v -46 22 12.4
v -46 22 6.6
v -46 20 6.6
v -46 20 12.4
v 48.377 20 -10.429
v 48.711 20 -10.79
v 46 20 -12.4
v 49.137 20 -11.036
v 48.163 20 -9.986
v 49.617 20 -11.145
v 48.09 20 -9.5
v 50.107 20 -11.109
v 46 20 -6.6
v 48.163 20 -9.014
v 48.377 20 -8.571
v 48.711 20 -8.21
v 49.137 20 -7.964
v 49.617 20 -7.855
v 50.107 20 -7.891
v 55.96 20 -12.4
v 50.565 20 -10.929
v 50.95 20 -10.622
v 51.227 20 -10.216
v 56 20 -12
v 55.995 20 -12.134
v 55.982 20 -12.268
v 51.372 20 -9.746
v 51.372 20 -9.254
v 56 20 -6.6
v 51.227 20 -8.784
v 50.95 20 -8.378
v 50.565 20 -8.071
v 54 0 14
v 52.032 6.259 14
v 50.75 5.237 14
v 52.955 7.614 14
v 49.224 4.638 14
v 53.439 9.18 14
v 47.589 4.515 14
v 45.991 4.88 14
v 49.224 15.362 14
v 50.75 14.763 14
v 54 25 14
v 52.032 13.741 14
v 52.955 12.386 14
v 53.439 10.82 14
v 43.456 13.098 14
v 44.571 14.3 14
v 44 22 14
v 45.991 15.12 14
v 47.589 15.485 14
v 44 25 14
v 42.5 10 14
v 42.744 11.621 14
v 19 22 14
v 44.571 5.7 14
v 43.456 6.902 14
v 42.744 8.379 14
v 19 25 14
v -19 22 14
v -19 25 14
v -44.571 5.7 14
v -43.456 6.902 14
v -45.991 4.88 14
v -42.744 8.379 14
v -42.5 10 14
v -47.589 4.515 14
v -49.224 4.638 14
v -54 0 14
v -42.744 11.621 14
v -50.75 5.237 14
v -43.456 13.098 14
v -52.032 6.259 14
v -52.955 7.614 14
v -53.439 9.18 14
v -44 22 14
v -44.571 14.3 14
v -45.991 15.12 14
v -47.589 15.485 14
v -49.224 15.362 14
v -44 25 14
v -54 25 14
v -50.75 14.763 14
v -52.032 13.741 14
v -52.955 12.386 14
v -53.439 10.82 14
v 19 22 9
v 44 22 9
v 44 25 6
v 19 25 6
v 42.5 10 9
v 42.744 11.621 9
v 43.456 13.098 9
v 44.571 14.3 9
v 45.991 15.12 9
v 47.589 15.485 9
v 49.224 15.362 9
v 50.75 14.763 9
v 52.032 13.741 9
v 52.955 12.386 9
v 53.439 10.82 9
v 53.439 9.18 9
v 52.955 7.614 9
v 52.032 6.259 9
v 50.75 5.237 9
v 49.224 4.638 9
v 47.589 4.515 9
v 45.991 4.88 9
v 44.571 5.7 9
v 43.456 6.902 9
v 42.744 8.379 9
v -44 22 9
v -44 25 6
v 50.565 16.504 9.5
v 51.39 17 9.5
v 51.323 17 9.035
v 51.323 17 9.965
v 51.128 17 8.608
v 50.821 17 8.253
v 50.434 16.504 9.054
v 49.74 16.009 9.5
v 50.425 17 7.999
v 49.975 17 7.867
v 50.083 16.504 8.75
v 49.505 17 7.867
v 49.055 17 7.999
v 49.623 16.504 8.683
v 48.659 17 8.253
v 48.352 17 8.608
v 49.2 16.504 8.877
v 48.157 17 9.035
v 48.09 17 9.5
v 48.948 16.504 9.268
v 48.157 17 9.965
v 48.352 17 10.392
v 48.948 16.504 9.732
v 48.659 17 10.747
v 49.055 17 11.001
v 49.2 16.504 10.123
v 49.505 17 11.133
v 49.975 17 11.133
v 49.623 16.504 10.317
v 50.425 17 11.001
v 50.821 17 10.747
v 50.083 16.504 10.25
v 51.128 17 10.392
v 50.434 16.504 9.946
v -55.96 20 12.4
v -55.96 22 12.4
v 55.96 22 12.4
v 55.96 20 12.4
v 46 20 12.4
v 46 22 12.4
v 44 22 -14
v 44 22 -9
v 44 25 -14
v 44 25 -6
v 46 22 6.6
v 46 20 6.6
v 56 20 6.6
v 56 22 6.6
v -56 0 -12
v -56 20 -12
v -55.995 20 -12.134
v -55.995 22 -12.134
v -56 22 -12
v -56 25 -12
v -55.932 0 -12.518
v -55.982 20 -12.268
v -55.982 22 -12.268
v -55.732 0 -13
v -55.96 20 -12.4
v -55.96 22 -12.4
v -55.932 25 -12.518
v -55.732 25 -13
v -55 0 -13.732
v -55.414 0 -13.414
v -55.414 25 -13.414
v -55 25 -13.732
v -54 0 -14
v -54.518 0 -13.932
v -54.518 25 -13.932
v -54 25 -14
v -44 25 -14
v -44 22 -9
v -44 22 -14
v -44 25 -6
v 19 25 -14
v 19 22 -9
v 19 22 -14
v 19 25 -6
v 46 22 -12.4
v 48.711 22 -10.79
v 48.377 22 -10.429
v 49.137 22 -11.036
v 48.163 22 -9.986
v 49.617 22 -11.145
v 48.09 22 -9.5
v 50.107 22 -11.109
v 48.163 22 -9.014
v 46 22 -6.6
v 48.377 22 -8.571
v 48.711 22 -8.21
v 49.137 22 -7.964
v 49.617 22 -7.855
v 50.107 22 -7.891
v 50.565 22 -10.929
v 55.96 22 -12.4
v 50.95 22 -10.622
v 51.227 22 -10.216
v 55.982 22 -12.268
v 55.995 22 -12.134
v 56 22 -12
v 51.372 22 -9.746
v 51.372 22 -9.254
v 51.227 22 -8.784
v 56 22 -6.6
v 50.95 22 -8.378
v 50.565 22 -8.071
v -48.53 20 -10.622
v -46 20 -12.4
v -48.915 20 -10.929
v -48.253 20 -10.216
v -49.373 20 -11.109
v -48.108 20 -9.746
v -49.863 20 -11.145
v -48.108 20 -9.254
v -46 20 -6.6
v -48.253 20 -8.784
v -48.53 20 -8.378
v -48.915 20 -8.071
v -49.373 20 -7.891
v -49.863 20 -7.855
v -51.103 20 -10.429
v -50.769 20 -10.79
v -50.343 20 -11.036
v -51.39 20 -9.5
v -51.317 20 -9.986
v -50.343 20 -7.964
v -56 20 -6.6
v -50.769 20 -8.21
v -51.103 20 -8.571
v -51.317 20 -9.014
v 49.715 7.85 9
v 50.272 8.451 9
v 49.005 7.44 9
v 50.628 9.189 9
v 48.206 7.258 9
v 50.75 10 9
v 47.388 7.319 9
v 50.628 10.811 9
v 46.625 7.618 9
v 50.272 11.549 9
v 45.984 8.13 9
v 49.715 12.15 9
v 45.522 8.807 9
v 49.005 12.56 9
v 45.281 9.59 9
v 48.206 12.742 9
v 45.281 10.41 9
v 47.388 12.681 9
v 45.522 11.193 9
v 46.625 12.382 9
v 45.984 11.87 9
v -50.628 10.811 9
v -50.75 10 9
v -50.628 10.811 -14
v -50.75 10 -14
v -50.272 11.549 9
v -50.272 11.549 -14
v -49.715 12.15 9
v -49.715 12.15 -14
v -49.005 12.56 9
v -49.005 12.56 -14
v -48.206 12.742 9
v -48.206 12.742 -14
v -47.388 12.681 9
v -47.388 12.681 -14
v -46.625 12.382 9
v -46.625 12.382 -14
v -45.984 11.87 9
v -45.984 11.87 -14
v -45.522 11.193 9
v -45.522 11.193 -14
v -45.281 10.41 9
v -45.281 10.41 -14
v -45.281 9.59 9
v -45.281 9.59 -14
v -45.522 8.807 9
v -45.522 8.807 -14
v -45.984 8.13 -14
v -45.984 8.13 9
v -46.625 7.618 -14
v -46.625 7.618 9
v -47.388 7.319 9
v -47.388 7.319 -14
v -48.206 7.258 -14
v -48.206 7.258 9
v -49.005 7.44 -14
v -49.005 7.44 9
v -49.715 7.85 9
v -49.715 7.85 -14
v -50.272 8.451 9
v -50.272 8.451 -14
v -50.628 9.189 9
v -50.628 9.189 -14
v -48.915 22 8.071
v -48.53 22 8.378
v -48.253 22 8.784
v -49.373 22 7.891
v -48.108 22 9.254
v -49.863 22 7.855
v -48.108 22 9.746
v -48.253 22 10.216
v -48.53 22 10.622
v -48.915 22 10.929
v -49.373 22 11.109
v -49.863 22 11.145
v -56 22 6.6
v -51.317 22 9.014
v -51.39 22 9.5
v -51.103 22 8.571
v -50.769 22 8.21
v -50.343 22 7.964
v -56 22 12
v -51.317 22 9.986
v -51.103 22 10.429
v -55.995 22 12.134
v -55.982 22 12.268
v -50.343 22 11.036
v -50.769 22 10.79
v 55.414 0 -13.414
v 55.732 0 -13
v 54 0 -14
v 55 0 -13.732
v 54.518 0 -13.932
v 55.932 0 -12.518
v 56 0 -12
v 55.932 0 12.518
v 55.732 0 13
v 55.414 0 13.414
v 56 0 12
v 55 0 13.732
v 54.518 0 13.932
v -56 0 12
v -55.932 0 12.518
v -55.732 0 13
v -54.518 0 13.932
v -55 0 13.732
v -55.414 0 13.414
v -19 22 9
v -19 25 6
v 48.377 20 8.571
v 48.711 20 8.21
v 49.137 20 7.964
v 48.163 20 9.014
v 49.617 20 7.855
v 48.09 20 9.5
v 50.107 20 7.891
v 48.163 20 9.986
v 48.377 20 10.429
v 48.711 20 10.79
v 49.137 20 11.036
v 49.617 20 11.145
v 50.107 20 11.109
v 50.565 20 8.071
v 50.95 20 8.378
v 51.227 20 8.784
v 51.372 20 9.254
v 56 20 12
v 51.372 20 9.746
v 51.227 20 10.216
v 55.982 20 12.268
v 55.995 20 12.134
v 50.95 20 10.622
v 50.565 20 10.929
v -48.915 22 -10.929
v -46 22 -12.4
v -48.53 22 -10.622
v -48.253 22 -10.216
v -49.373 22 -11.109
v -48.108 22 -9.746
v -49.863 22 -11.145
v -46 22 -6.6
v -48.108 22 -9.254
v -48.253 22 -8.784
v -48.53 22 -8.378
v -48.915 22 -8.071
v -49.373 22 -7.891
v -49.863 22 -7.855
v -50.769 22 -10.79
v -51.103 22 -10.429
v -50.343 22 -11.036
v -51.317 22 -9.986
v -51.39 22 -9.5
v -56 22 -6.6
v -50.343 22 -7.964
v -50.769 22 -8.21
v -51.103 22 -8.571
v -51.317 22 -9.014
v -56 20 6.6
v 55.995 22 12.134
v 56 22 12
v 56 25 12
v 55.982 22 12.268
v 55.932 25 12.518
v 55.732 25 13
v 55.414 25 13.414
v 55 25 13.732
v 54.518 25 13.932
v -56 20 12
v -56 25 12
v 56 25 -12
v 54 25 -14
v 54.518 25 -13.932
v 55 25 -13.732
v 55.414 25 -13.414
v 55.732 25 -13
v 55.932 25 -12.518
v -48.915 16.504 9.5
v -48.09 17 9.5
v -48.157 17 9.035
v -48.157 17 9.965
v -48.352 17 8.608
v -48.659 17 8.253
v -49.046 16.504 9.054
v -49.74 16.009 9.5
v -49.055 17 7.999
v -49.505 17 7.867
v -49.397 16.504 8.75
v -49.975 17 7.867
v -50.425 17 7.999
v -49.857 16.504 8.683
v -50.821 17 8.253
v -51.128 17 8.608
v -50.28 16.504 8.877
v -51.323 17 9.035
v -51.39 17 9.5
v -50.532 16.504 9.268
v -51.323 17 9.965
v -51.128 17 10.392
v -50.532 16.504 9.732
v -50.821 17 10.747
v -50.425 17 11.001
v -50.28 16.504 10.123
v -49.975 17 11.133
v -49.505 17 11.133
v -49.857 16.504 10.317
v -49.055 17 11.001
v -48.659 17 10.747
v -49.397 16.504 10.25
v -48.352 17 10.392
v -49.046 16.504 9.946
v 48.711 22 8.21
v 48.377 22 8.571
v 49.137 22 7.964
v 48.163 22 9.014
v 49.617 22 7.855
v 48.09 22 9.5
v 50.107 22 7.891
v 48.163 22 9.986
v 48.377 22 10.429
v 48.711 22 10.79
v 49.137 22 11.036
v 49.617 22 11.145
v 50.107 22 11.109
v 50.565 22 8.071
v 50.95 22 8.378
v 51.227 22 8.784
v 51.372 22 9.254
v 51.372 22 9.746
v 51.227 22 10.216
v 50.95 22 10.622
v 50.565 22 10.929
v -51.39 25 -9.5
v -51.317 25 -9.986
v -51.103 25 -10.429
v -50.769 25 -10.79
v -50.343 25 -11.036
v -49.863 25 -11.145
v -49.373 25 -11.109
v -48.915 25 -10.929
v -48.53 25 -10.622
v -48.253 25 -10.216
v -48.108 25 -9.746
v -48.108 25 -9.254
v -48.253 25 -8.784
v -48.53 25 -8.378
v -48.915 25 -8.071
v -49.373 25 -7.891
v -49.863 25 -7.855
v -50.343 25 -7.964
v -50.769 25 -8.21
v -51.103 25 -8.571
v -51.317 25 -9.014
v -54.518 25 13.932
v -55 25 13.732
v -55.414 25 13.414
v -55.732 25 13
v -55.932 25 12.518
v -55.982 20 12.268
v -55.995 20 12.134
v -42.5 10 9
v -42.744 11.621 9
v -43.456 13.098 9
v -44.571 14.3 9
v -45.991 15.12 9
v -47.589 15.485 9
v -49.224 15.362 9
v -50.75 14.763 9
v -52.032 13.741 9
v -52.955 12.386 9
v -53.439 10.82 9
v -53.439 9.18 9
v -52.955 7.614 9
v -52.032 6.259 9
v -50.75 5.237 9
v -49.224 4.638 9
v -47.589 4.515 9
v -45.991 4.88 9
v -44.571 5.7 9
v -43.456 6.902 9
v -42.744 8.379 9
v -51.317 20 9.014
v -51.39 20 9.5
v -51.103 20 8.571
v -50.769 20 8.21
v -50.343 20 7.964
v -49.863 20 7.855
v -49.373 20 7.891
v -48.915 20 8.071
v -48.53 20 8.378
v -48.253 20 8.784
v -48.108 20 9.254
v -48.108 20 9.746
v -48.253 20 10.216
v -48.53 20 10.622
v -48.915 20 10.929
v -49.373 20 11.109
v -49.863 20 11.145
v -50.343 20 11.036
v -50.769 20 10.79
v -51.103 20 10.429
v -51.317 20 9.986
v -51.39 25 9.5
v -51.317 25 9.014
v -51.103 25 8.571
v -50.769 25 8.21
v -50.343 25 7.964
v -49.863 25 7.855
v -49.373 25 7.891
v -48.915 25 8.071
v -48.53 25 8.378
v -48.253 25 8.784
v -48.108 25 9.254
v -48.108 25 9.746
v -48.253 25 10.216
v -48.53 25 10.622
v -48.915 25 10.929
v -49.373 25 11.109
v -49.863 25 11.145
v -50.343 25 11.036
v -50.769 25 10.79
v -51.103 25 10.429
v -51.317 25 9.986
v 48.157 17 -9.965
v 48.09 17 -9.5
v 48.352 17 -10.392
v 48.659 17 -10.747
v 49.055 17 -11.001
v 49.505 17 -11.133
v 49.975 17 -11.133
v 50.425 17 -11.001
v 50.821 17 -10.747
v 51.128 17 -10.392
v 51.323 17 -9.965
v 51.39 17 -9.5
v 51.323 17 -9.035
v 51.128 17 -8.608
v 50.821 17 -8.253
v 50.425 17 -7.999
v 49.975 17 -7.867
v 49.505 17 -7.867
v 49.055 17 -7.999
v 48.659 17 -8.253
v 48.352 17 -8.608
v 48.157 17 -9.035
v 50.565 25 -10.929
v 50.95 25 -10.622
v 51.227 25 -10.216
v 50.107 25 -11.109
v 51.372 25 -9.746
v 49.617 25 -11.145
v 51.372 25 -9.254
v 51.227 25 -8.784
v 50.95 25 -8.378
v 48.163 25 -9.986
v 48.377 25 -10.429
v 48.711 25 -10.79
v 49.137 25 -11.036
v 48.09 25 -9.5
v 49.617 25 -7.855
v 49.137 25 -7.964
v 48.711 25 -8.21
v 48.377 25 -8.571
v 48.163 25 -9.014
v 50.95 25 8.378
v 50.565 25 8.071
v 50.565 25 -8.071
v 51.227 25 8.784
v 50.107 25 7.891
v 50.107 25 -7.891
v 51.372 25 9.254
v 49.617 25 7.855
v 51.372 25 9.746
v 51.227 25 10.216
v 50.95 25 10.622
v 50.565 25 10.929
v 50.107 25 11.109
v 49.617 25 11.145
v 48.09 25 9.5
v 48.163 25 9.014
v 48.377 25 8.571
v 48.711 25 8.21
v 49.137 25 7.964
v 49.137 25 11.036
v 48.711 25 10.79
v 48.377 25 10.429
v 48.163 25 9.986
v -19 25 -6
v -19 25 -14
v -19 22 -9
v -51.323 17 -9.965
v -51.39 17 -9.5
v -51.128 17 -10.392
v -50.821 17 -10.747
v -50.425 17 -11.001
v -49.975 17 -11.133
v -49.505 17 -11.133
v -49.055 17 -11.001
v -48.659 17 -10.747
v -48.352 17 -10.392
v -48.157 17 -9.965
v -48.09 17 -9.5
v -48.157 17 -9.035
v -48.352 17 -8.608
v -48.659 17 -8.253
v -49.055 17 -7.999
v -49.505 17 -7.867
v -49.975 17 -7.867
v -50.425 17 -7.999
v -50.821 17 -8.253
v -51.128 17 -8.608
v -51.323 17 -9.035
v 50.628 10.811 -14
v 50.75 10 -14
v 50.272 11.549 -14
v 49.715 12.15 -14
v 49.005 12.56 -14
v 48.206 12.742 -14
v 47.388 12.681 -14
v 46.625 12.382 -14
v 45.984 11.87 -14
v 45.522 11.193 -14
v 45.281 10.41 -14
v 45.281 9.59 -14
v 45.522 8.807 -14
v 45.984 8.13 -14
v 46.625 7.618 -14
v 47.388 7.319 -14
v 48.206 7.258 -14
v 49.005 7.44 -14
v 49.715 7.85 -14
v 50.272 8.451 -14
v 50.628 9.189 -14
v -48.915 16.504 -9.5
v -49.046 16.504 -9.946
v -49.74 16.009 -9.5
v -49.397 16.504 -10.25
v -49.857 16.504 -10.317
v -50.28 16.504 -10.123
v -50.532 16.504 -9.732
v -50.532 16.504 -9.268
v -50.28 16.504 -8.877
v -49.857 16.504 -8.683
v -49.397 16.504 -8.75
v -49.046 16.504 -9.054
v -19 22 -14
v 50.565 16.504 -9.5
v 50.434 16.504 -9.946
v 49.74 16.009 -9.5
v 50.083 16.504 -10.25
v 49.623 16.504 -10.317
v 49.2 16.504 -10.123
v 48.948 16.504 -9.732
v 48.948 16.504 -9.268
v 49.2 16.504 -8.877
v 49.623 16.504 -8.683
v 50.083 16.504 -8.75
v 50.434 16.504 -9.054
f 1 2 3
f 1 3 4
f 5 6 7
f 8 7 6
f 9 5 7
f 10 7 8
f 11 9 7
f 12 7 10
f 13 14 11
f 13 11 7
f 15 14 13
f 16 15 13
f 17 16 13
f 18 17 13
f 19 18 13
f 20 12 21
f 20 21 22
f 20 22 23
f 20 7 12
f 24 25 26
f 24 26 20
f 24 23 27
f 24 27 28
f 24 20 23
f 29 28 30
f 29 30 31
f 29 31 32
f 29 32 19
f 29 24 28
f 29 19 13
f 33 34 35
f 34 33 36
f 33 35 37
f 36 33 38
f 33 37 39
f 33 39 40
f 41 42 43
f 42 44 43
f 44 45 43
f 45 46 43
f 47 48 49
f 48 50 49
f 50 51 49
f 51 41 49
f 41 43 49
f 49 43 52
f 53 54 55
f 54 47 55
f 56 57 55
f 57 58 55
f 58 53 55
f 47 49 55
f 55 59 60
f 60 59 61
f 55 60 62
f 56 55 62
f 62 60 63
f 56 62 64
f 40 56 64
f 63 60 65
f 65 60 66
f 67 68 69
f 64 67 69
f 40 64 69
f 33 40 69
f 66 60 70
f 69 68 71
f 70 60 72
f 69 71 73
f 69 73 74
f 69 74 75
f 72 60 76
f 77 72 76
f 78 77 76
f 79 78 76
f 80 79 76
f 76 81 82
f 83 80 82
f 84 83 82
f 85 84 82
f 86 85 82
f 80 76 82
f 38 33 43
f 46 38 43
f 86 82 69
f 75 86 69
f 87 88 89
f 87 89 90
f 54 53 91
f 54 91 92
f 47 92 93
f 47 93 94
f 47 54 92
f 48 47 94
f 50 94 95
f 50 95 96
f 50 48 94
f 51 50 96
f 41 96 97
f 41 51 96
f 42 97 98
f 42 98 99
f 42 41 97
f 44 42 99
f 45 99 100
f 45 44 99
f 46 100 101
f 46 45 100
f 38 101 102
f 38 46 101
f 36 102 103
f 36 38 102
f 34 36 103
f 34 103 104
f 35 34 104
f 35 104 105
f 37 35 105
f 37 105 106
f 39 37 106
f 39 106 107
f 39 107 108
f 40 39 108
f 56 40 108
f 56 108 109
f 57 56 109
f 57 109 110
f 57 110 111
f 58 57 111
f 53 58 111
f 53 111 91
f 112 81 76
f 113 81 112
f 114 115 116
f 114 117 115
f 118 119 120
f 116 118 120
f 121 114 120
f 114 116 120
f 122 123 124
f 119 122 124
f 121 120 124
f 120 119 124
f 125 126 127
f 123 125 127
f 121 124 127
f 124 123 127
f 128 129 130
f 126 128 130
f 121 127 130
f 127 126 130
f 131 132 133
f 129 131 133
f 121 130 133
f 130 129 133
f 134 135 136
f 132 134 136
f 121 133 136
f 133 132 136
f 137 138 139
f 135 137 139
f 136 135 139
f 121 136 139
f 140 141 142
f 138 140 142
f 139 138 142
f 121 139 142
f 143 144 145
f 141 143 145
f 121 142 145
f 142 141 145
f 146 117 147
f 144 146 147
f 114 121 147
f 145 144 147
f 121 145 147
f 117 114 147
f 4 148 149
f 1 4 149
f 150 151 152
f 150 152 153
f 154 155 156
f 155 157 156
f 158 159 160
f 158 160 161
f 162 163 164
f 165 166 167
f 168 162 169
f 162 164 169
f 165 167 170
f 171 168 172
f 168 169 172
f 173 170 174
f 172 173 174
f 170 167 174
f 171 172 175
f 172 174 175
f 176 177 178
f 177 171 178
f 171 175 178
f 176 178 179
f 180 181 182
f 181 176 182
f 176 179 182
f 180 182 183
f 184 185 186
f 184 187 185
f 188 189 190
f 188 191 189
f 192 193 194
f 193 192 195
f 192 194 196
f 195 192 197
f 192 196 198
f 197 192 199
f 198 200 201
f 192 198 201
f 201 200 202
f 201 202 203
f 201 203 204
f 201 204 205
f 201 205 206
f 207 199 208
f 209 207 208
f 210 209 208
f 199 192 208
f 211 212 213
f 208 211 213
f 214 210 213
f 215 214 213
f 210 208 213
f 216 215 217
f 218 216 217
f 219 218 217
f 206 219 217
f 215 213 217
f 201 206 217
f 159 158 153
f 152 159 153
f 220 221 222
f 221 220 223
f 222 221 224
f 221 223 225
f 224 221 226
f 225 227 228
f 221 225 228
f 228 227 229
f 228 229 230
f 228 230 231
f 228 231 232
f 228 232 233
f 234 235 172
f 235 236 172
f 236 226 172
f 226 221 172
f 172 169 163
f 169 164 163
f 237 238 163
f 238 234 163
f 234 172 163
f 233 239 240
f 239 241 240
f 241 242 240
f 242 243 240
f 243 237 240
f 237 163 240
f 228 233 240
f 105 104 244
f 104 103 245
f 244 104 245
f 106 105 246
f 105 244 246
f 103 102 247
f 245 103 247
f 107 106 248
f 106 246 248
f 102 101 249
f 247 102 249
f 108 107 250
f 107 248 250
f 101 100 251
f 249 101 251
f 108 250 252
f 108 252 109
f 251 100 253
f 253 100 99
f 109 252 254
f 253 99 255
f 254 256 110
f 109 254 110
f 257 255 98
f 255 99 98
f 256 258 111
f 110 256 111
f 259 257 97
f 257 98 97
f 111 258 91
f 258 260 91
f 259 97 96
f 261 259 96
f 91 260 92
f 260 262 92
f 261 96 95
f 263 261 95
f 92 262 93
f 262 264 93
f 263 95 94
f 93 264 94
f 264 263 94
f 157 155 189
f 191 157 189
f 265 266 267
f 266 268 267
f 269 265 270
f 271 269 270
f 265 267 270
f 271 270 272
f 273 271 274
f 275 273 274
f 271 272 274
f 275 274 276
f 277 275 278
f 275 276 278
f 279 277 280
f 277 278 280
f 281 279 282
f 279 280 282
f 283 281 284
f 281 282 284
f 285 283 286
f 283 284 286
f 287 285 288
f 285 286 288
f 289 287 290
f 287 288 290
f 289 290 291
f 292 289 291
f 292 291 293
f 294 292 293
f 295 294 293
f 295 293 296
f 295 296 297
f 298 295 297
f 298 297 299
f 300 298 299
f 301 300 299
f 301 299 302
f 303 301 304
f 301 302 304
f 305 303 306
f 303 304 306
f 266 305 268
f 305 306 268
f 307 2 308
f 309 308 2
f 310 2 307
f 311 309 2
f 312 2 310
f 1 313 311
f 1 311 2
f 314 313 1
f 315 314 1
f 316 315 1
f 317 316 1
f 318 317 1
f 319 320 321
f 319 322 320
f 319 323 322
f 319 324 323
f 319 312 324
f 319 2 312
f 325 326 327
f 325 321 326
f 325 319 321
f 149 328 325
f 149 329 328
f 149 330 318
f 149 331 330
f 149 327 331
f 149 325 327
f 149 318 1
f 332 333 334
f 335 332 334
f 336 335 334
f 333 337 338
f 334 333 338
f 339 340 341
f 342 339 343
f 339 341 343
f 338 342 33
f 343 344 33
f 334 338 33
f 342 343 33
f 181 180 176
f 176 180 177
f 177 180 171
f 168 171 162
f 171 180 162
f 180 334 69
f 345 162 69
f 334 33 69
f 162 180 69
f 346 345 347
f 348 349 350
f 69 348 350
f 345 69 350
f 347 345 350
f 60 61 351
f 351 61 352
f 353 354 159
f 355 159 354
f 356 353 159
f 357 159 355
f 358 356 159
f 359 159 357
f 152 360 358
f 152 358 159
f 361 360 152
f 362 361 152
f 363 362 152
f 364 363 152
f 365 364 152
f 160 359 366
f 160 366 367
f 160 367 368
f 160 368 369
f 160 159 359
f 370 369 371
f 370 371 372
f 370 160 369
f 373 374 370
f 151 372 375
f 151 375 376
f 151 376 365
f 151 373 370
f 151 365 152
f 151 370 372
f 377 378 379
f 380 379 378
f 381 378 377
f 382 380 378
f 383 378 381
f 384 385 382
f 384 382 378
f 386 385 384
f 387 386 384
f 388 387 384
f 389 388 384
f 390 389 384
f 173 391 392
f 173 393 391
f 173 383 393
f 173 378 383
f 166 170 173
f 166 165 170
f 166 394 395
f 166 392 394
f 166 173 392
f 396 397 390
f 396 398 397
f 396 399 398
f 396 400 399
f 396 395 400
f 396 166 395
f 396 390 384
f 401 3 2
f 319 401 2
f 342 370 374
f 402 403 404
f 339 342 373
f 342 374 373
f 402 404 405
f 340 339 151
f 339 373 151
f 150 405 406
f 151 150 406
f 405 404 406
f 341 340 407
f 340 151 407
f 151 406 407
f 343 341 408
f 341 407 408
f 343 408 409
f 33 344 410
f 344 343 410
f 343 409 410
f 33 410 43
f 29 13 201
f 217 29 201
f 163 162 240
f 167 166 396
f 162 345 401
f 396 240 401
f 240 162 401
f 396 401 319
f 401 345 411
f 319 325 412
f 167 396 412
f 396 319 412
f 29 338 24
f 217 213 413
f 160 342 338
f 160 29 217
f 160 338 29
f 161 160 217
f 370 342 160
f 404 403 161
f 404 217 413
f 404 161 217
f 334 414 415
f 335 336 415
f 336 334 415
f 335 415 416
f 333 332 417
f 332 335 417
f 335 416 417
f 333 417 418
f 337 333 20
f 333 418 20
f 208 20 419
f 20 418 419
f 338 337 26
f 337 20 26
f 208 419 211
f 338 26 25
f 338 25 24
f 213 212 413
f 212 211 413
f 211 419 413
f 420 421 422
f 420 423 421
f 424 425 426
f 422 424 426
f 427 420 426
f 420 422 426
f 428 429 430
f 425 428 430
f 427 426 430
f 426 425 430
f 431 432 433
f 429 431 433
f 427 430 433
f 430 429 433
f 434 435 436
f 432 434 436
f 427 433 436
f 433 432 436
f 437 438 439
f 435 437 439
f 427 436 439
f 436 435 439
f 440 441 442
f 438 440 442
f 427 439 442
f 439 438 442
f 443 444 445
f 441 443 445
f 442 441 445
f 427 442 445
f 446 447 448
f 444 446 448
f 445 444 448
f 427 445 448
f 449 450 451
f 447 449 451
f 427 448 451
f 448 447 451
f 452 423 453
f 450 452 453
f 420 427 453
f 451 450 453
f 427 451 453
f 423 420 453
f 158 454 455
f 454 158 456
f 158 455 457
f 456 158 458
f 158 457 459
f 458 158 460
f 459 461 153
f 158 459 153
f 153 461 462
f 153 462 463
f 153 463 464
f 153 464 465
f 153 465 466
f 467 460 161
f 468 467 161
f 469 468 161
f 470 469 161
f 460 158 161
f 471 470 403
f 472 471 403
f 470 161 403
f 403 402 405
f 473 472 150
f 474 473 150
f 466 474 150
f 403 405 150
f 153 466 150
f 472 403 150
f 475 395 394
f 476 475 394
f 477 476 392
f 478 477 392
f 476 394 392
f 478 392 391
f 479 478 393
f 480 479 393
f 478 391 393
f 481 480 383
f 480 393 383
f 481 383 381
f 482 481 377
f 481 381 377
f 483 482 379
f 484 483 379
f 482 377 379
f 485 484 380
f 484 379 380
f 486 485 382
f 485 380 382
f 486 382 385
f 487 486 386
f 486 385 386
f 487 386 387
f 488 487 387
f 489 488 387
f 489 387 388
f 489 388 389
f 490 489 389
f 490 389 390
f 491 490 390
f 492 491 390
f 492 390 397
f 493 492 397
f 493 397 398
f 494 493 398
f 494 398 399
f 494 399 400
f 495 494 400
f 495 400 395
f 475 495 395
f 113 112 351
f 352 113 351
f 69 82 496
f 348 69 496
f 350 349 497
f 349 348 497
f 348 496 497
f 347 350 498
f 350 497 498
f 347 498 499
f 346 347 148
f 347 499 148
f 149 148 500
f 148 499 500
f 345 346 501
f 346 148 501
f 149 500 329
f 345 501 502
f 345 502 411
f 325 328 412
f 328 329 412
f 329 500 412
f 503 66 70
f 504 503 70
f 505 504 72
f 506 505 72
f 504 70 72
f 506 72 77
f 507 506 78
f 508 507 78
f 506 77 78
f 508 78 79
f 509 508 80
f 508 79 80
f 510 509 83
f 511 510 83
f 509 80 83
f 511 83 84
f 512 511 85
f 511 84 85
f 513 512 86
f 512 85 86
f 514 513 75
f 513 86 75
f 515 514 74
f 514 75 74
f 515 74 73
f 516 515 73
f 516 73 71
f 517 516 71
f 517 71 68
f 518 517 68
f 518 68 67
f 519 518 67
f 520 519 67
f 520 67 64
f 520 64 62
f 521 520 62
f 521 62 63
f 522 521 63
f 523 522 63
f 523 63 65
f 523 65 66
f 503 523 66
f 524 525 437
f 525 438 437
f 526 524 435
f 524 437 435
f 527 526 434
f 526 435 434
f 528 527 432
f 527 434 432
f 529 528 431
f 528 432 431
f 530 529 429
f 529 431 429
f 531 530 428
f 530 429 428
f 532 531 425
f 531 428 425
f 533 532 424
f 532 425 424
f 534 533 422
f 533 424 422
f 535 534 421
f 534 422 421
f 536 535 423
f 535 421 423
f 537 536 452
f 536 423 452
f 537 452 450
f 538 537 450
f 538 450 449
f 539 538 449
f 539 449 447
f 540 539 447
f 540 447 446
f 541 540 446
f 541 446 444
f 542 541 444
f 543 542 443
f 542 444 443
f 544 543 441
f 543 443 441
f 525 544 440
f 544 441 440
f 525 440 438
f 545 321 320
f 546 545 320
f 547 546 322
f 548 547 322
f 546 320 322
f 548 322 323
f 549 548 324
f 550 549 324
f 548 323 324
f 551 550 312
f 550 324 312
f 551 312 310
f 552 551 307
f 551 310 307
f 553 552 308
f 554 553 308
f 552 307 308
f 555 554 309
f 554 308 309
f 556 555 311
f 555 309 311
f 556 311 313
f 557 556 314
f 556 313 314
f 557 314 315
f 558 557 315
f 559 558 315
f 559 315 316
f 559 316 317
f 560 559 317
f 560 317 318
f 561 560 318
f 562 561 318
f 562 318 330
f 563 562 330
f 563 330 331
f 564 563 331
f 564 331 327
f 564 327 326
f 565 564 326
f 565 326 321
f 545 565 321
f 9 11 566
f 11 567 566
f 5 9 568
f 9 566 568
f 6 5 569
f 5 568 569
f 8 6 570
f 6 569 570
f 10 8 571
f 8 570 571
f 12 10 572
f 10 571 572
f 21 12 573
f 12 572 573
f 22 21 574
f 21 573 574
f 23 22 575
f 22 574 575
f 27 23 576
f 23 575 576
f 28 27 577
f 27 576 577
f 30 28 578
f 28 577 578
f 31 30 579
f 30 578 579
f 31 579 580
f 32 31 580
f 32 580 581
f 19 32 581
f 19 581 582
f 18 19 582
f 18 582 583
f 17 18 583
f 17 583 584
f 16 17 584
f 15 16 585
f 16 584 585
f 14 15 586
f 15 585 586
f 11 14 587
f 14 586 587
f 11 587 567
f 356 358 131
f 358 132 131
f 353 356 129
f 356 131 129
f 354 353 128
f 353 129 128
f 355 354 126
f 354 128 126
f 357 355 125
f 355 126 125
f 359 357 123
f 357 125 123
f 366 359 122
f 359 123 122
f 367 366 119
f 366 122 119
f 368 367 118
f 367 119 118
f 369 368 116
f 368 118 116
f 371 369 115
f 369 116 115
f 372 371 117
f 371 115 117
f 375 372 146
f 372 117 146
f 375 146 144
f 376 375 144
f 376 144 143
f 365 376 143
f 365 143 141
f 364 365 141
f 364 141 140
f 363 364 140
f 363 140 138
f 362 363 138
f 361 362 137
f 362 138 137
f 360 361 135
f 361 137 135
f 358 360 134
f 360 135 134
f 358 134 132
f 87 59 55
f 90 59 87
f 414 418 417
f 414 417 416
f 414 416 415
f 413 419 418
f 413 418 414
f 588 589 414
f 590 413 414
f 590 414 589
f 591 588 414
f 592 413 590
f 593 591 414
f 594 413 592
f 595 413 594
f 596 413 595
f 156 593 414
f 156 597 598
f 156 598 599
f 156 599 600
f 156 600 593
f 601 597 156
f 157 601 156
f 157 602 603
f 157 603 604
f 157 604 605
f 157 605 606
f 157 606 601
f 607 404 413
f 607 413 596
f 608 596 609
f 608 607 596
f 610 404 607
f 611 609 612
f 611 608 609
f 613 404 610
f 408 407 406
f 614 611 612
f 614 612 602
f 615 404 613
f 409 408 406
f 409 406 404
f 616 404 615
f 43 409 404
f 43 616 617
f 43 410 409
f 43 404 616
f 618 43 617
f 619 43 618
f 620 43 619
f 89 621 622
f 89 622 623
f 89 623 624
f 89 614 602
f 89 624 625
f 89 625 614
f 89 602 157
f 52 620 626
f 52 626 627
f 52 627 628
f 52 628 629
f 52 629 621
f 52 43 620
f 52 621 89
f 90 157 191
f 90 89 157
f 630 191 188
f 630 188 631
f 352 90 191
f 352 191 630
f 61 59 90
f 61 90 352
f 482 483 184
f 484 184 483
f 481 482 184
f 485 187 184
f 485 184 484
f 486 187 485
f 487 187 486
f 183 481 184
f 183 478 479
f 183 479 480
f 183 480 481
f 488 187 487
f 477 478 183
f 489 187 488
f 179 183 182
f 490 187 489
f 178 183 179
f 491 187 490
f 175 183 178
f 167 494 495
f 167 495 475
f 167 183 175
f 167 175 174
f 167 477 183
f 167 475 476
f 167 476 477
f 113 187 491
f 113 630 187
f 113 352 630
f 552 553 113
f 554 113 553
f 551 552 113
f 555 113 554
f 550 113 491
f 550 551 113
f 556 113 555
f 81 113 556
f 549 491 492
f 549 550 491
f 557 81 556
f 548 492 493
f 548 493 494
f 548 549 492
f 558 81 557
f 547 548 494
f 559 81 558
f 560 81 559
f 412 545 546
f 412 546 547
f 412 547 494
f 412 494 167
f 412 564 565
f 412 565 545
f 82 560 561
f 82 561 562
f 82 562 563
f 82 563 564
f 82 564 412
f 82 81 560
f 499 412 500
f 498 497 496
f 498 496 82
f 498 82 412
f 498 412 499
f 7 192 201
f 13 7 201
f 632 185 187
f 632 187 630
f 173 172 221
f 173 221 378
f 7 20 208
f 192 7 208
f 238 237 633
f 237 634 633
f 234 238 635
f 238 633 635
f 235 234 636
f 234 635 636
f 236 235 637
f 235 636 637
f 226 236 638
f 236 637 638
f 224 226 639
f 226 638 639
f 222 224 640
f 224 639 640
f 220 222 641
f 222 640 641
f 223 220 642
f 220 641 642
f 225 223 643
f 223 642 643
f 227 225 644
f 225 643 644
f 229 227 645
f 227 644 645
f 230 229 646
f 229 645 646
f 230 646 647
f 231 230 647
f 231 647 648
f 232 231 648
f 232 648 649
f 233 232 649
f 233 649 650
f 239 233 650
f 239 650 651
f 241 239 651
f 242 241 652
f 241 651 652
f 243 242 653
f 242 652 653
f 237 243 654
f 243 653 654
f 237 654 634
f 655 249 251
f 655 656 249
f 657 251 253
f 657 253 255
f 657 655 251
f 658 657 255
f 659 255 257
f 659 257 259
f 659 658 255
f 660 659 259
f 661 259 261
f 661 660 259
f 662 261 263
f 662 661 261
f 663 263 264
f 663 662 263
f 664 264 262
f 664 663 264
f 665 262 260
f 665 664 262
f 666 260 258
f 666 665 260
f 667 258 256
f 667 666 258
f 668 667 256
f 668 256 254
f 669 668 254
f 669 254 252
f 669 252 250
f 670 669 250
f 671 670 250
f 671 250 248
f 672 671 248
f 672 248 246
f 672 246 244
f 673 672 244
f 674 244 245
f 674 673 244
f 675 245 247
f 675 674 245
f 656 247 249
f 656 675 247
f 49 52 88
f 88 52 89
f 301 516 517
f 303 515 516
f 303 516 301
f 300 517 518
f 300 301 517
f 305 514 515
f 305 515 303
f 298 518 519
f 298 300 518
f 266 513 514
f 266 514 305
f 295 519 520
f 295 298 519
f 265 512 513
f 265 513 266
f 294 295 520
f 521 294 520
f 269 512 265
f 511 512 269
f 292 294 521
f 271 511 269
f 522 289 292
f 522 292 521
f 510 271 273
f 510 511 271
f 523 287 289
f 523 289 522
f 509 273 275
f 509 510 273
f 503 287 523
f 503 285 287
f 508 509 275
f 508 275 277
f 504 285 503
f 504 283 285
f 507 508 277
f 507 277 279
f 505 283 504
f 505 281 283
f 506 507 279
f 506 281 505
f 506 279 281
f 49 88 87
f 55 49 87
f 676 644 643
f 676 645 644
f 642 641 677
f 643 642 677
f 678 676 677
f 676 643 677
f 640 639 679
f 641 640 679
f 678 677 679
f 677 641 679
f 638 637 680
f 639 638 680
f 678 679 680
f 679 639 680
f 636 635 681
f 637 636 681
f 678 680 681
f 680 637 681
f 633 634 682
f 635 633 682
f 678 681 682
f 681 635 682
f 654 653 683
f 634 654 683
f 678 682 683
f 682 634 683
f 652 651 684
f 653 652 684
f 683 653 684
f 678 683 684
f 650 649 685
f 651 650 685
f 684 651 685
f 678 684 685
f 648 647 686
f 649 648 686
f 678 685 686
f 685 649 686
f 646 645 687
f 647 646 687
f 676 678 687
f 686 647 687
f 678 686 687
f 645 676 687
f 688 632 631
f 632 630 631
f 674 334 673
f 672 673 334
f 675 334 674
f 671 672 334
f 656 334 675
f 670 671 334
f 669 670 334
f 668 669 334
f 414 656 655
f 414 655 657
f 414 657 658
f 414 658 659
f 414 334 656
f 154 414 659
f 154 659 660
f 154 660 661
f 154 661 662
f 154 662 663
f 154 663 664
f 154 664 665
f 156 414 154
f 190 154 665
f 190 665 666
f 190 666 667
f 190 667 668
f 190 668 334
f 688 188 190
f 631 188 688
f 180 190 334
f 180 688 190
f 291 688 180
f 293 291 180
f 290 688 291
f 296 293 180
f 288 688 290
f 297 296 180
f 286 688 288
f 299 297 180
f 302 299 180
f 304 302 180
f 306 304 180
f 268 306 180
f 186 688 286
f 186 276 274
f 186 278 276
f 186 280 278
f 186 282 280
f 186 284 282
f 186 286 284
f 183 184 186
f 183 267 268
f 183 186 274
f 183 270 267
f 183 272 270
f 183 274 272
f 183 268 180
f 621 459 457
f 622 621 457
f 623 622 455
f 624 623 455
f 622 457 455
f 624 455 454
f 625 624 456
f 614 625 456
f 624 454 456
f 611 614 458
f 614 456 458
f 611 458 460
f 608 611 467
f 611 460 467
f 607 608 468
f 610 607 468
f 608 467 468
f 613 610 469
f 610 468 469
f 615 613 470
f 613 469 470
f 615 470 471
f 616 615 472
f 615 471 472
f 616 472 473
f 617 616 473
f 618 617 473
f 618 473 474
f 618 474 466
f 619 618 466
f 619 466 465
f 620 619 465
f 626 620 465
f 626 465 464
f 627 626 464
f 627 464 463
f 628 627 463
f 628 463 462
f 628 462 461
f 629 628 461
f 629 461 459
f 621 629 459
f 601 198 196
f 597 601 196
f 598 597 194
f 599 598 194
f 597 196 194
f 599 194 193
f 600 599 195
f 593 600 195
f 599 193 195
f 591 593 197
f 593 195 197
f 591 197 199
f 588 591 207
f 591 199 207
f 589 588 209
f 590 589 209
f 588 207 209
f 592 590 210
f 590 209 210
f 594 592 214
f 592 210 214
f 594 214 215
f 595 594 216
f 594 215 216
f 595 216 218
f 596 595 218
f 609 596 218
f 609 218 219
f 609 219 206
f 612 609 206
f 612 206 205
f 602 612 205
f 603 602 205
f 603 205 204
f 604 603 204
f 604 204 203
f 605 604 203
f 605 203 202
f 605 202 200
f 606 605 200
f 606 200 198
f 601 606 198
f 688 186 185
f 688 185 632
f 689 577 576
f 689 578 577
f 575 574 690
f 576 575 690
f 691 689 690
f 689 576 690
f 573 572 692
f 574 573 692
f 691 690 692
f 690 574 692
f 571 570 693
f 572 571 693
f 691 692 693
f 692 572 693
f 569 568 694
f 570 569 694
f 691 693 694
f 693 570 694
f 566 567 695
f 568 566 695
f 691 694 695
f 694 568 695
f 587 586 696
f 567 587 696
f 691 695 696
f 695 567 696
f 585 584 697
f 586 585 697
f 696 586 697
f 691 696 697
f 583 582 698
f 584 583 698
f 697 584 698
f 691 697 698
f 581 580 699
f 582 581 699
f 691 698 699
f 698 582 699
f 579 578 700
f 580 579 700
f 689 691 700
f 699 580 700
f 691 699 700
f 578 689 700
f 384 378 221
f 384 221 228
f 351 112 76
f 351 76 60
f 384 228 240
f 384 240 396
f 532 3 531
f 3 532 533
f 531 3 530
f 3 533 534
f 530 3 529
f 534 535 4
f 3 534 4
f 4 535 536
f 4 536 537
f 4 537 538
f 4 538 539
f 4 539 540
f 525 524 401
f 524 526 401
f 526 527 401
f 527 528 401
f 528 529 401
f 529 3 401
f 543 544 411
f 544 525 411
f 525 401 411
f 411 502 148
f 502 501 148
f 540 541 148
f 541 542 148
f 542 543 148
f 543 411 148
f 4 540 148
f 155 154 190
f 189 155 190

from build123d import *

# Parameters (mm, degrees)
SKETCH1_W                               = 56
SKETCH1_H                               = 25
BOSS_EXTRUDE1_DEPTH                     = 14
CBORE_FOR_M5_HEX_HEAD_BOLT1_D           = 5.5
CBORE_FOR_M5_HEX_HEAD_BOLT1_CBORE_D     = 11
CBORE_FOR_M5_HEX_HEAD_BOLT1_CBORE_DEPTH = 5
SKETCH9_W                               = 25
SKETCH9_H                               = 8
CUT_EXTRUDE2_DEPTH                      = 3
SKETCH8_W                               = 5.8
SKETCH8_H                               = 2
CUT_EXTRUDE1_DEPTH                      = 10
F_3_0MM_DOWEL_HOLE1_D                   = 3.3
F_3_0MM_DOWEL_HOLE1_DEPTH               = 8
F_3_0MM_DOWEL_HOLE1_TIP                 = 0.991420021
FILLET1_R                               = 2
CHAMFER2_SIZE                           = 3


# Some blends are built 0.0001 mm under size
with BuildPart() as part:
    # Sketch1 → Boss-Extrude1 (new, symmetric)
    with BuildSketch(Plane.XY):
        with Locations((-28, 12.5)):
            Rectangle(SKETCH1_W, SKETCH1_H)
    extrude(amount=BOSS_EXTRUDE1_DEPTH, both=True)

    # CBORE for M5 Hex Head Bolt1 (through all)
    with Locations(Plane.XY.offset(14)):
        with Locations((-48, 10)):
            CounterBoreHole(CBORE_FOR_M5_HEX_HEAD_BOLT1_D / 2, CBORE_FOR_M5_HEX_HEAD_BOLT1_CBORE_D / 2, CBORE_FOR_M5_HEX_HEAD_BOLT1_CBORE_DEPTH)

    # Sketch9 → Cut-Extrude2 (cut)
    with BuildSketch(Plane(origin=(0, 25, 0), x_dir=(1, 0, 0), z_dir=(0, 1, 0))):
        with Locations((-31.5, 10)):
            Rectangle(SKETCH9_W, SKETCH9_H)
        with Locations((-31.5, -10)):
            Rectangle(SKETCH9_W, SKETCH9_H)
    extrude(amount=-CUT_EXTRUDE2_DEPTH, mode=Mode.SUBTRACT)

    # Sketch8 → Cut-Extrude1 (cut)
    with BuildSketch(Plane.ZY.offset(56)):
        with Locations((-9.5, 21)):
            Rectangle(SKETCH8_W, SKETCH8_H)
        with Locations((9.5, 21)):
            Rectangle(SKETCH8_W, SKETCH8_H)
    extrude(amount=-CUT_EXTRUDE1_DEPTH, mode=Mode.SUBTRACT)

    # Mirror1: part across plane


with BuildPart() as part_1:
    add(part.part)
    add(part.part.mirror(Plane(origin=(0, 25, 14), x_dir=(0, 0, 1), z_dir=(-1, 0, 0))))

    # Ø3.0mm Dowel Hole1
    with Locations(Plane(origin=(0, 25, 0), x_dir=(1, 0, 0), z_dir=(0, 1, 0))):
        with Locations((49.74, 9.5), (-49.74, -9.5), (-49.74, 9.5), (49.74, -9.5)):
            Hole(F_3_0MM_DOWEL_HOLE1_D / 2, depth=F_3_0MM_DOWEL_HOLE1_DEPTH)
            with Locations((0, 0, -(F_3_0MM_DOWEL_HOLE1_DEPTH + F_3_0MM_DOWEL_HOLE1_TIP / 2))):  # 118° drill point
                Cone(0, F_3_0MM_DOWEL_HOLE1_D / 2, F_3_0MM_DOWEL_HOLE1_TIP, mode=Mode.SUBTRACT)

    # Fillet1
    # the kernel refuses this fillet: 2 mm, written as the material it takes off along each edge
    with BuildSketch(Plane(origin=(-56, 30, -14), x_dir=(0, 0, 1), z_dir=(0, -1, 0)), Plane(origin=(56, 30, -14), x_dir=(-1, 0, 0), z_dir=(0, -1, 0))) as fillet1_piece_1:
        with BuildLine():
            CenterArc((FILLET1_R, -FILLET1_R), FILLET1_R, 90, 90)
            Line((0, -FILLET1_R), (0, 0))
            Line((0, 0), (FILLET1_R, 0))
        make_face()
    extrude(amount=35, mode=Mode.SUBTRACT)
    with BuildSketch(Plane(origin=(-56, 30, 14), x_dir=(0, 0, -1), z_dir=(0, -1, 0)), Plane(origin=(56, 30, 14), x_dir=(-1, 0, 0), z_dir=(0, -1, 0))) as fillet1_piece_2:
        with BuildLine():
            CenterArc((FILLET1_R, FILLET1_R), FILLET1_R, 180, 90)
            Line((0, FILLET1_R), (0, 0))
            Line((0, 0), (FILLET1_R, 0))
        make_face()
    extrude(amount=35, mode=Mode.SUBTRACT)

    # Chamfer2
    chamfer2_edges = [part_1.edges().sort_by_distance(p)[0] for p in [
        (-31.5, 22, 6),
        (31.5, 22, 6),
        (-31.5, 22, -6),
        (31.5, 22, -6),
    ]]
    chamfer(chamfer2_edges, length=CHAMFER2_SIZE - 0.0001)  # a hair under: the kernel refuses the full size


solid = part_1.part
